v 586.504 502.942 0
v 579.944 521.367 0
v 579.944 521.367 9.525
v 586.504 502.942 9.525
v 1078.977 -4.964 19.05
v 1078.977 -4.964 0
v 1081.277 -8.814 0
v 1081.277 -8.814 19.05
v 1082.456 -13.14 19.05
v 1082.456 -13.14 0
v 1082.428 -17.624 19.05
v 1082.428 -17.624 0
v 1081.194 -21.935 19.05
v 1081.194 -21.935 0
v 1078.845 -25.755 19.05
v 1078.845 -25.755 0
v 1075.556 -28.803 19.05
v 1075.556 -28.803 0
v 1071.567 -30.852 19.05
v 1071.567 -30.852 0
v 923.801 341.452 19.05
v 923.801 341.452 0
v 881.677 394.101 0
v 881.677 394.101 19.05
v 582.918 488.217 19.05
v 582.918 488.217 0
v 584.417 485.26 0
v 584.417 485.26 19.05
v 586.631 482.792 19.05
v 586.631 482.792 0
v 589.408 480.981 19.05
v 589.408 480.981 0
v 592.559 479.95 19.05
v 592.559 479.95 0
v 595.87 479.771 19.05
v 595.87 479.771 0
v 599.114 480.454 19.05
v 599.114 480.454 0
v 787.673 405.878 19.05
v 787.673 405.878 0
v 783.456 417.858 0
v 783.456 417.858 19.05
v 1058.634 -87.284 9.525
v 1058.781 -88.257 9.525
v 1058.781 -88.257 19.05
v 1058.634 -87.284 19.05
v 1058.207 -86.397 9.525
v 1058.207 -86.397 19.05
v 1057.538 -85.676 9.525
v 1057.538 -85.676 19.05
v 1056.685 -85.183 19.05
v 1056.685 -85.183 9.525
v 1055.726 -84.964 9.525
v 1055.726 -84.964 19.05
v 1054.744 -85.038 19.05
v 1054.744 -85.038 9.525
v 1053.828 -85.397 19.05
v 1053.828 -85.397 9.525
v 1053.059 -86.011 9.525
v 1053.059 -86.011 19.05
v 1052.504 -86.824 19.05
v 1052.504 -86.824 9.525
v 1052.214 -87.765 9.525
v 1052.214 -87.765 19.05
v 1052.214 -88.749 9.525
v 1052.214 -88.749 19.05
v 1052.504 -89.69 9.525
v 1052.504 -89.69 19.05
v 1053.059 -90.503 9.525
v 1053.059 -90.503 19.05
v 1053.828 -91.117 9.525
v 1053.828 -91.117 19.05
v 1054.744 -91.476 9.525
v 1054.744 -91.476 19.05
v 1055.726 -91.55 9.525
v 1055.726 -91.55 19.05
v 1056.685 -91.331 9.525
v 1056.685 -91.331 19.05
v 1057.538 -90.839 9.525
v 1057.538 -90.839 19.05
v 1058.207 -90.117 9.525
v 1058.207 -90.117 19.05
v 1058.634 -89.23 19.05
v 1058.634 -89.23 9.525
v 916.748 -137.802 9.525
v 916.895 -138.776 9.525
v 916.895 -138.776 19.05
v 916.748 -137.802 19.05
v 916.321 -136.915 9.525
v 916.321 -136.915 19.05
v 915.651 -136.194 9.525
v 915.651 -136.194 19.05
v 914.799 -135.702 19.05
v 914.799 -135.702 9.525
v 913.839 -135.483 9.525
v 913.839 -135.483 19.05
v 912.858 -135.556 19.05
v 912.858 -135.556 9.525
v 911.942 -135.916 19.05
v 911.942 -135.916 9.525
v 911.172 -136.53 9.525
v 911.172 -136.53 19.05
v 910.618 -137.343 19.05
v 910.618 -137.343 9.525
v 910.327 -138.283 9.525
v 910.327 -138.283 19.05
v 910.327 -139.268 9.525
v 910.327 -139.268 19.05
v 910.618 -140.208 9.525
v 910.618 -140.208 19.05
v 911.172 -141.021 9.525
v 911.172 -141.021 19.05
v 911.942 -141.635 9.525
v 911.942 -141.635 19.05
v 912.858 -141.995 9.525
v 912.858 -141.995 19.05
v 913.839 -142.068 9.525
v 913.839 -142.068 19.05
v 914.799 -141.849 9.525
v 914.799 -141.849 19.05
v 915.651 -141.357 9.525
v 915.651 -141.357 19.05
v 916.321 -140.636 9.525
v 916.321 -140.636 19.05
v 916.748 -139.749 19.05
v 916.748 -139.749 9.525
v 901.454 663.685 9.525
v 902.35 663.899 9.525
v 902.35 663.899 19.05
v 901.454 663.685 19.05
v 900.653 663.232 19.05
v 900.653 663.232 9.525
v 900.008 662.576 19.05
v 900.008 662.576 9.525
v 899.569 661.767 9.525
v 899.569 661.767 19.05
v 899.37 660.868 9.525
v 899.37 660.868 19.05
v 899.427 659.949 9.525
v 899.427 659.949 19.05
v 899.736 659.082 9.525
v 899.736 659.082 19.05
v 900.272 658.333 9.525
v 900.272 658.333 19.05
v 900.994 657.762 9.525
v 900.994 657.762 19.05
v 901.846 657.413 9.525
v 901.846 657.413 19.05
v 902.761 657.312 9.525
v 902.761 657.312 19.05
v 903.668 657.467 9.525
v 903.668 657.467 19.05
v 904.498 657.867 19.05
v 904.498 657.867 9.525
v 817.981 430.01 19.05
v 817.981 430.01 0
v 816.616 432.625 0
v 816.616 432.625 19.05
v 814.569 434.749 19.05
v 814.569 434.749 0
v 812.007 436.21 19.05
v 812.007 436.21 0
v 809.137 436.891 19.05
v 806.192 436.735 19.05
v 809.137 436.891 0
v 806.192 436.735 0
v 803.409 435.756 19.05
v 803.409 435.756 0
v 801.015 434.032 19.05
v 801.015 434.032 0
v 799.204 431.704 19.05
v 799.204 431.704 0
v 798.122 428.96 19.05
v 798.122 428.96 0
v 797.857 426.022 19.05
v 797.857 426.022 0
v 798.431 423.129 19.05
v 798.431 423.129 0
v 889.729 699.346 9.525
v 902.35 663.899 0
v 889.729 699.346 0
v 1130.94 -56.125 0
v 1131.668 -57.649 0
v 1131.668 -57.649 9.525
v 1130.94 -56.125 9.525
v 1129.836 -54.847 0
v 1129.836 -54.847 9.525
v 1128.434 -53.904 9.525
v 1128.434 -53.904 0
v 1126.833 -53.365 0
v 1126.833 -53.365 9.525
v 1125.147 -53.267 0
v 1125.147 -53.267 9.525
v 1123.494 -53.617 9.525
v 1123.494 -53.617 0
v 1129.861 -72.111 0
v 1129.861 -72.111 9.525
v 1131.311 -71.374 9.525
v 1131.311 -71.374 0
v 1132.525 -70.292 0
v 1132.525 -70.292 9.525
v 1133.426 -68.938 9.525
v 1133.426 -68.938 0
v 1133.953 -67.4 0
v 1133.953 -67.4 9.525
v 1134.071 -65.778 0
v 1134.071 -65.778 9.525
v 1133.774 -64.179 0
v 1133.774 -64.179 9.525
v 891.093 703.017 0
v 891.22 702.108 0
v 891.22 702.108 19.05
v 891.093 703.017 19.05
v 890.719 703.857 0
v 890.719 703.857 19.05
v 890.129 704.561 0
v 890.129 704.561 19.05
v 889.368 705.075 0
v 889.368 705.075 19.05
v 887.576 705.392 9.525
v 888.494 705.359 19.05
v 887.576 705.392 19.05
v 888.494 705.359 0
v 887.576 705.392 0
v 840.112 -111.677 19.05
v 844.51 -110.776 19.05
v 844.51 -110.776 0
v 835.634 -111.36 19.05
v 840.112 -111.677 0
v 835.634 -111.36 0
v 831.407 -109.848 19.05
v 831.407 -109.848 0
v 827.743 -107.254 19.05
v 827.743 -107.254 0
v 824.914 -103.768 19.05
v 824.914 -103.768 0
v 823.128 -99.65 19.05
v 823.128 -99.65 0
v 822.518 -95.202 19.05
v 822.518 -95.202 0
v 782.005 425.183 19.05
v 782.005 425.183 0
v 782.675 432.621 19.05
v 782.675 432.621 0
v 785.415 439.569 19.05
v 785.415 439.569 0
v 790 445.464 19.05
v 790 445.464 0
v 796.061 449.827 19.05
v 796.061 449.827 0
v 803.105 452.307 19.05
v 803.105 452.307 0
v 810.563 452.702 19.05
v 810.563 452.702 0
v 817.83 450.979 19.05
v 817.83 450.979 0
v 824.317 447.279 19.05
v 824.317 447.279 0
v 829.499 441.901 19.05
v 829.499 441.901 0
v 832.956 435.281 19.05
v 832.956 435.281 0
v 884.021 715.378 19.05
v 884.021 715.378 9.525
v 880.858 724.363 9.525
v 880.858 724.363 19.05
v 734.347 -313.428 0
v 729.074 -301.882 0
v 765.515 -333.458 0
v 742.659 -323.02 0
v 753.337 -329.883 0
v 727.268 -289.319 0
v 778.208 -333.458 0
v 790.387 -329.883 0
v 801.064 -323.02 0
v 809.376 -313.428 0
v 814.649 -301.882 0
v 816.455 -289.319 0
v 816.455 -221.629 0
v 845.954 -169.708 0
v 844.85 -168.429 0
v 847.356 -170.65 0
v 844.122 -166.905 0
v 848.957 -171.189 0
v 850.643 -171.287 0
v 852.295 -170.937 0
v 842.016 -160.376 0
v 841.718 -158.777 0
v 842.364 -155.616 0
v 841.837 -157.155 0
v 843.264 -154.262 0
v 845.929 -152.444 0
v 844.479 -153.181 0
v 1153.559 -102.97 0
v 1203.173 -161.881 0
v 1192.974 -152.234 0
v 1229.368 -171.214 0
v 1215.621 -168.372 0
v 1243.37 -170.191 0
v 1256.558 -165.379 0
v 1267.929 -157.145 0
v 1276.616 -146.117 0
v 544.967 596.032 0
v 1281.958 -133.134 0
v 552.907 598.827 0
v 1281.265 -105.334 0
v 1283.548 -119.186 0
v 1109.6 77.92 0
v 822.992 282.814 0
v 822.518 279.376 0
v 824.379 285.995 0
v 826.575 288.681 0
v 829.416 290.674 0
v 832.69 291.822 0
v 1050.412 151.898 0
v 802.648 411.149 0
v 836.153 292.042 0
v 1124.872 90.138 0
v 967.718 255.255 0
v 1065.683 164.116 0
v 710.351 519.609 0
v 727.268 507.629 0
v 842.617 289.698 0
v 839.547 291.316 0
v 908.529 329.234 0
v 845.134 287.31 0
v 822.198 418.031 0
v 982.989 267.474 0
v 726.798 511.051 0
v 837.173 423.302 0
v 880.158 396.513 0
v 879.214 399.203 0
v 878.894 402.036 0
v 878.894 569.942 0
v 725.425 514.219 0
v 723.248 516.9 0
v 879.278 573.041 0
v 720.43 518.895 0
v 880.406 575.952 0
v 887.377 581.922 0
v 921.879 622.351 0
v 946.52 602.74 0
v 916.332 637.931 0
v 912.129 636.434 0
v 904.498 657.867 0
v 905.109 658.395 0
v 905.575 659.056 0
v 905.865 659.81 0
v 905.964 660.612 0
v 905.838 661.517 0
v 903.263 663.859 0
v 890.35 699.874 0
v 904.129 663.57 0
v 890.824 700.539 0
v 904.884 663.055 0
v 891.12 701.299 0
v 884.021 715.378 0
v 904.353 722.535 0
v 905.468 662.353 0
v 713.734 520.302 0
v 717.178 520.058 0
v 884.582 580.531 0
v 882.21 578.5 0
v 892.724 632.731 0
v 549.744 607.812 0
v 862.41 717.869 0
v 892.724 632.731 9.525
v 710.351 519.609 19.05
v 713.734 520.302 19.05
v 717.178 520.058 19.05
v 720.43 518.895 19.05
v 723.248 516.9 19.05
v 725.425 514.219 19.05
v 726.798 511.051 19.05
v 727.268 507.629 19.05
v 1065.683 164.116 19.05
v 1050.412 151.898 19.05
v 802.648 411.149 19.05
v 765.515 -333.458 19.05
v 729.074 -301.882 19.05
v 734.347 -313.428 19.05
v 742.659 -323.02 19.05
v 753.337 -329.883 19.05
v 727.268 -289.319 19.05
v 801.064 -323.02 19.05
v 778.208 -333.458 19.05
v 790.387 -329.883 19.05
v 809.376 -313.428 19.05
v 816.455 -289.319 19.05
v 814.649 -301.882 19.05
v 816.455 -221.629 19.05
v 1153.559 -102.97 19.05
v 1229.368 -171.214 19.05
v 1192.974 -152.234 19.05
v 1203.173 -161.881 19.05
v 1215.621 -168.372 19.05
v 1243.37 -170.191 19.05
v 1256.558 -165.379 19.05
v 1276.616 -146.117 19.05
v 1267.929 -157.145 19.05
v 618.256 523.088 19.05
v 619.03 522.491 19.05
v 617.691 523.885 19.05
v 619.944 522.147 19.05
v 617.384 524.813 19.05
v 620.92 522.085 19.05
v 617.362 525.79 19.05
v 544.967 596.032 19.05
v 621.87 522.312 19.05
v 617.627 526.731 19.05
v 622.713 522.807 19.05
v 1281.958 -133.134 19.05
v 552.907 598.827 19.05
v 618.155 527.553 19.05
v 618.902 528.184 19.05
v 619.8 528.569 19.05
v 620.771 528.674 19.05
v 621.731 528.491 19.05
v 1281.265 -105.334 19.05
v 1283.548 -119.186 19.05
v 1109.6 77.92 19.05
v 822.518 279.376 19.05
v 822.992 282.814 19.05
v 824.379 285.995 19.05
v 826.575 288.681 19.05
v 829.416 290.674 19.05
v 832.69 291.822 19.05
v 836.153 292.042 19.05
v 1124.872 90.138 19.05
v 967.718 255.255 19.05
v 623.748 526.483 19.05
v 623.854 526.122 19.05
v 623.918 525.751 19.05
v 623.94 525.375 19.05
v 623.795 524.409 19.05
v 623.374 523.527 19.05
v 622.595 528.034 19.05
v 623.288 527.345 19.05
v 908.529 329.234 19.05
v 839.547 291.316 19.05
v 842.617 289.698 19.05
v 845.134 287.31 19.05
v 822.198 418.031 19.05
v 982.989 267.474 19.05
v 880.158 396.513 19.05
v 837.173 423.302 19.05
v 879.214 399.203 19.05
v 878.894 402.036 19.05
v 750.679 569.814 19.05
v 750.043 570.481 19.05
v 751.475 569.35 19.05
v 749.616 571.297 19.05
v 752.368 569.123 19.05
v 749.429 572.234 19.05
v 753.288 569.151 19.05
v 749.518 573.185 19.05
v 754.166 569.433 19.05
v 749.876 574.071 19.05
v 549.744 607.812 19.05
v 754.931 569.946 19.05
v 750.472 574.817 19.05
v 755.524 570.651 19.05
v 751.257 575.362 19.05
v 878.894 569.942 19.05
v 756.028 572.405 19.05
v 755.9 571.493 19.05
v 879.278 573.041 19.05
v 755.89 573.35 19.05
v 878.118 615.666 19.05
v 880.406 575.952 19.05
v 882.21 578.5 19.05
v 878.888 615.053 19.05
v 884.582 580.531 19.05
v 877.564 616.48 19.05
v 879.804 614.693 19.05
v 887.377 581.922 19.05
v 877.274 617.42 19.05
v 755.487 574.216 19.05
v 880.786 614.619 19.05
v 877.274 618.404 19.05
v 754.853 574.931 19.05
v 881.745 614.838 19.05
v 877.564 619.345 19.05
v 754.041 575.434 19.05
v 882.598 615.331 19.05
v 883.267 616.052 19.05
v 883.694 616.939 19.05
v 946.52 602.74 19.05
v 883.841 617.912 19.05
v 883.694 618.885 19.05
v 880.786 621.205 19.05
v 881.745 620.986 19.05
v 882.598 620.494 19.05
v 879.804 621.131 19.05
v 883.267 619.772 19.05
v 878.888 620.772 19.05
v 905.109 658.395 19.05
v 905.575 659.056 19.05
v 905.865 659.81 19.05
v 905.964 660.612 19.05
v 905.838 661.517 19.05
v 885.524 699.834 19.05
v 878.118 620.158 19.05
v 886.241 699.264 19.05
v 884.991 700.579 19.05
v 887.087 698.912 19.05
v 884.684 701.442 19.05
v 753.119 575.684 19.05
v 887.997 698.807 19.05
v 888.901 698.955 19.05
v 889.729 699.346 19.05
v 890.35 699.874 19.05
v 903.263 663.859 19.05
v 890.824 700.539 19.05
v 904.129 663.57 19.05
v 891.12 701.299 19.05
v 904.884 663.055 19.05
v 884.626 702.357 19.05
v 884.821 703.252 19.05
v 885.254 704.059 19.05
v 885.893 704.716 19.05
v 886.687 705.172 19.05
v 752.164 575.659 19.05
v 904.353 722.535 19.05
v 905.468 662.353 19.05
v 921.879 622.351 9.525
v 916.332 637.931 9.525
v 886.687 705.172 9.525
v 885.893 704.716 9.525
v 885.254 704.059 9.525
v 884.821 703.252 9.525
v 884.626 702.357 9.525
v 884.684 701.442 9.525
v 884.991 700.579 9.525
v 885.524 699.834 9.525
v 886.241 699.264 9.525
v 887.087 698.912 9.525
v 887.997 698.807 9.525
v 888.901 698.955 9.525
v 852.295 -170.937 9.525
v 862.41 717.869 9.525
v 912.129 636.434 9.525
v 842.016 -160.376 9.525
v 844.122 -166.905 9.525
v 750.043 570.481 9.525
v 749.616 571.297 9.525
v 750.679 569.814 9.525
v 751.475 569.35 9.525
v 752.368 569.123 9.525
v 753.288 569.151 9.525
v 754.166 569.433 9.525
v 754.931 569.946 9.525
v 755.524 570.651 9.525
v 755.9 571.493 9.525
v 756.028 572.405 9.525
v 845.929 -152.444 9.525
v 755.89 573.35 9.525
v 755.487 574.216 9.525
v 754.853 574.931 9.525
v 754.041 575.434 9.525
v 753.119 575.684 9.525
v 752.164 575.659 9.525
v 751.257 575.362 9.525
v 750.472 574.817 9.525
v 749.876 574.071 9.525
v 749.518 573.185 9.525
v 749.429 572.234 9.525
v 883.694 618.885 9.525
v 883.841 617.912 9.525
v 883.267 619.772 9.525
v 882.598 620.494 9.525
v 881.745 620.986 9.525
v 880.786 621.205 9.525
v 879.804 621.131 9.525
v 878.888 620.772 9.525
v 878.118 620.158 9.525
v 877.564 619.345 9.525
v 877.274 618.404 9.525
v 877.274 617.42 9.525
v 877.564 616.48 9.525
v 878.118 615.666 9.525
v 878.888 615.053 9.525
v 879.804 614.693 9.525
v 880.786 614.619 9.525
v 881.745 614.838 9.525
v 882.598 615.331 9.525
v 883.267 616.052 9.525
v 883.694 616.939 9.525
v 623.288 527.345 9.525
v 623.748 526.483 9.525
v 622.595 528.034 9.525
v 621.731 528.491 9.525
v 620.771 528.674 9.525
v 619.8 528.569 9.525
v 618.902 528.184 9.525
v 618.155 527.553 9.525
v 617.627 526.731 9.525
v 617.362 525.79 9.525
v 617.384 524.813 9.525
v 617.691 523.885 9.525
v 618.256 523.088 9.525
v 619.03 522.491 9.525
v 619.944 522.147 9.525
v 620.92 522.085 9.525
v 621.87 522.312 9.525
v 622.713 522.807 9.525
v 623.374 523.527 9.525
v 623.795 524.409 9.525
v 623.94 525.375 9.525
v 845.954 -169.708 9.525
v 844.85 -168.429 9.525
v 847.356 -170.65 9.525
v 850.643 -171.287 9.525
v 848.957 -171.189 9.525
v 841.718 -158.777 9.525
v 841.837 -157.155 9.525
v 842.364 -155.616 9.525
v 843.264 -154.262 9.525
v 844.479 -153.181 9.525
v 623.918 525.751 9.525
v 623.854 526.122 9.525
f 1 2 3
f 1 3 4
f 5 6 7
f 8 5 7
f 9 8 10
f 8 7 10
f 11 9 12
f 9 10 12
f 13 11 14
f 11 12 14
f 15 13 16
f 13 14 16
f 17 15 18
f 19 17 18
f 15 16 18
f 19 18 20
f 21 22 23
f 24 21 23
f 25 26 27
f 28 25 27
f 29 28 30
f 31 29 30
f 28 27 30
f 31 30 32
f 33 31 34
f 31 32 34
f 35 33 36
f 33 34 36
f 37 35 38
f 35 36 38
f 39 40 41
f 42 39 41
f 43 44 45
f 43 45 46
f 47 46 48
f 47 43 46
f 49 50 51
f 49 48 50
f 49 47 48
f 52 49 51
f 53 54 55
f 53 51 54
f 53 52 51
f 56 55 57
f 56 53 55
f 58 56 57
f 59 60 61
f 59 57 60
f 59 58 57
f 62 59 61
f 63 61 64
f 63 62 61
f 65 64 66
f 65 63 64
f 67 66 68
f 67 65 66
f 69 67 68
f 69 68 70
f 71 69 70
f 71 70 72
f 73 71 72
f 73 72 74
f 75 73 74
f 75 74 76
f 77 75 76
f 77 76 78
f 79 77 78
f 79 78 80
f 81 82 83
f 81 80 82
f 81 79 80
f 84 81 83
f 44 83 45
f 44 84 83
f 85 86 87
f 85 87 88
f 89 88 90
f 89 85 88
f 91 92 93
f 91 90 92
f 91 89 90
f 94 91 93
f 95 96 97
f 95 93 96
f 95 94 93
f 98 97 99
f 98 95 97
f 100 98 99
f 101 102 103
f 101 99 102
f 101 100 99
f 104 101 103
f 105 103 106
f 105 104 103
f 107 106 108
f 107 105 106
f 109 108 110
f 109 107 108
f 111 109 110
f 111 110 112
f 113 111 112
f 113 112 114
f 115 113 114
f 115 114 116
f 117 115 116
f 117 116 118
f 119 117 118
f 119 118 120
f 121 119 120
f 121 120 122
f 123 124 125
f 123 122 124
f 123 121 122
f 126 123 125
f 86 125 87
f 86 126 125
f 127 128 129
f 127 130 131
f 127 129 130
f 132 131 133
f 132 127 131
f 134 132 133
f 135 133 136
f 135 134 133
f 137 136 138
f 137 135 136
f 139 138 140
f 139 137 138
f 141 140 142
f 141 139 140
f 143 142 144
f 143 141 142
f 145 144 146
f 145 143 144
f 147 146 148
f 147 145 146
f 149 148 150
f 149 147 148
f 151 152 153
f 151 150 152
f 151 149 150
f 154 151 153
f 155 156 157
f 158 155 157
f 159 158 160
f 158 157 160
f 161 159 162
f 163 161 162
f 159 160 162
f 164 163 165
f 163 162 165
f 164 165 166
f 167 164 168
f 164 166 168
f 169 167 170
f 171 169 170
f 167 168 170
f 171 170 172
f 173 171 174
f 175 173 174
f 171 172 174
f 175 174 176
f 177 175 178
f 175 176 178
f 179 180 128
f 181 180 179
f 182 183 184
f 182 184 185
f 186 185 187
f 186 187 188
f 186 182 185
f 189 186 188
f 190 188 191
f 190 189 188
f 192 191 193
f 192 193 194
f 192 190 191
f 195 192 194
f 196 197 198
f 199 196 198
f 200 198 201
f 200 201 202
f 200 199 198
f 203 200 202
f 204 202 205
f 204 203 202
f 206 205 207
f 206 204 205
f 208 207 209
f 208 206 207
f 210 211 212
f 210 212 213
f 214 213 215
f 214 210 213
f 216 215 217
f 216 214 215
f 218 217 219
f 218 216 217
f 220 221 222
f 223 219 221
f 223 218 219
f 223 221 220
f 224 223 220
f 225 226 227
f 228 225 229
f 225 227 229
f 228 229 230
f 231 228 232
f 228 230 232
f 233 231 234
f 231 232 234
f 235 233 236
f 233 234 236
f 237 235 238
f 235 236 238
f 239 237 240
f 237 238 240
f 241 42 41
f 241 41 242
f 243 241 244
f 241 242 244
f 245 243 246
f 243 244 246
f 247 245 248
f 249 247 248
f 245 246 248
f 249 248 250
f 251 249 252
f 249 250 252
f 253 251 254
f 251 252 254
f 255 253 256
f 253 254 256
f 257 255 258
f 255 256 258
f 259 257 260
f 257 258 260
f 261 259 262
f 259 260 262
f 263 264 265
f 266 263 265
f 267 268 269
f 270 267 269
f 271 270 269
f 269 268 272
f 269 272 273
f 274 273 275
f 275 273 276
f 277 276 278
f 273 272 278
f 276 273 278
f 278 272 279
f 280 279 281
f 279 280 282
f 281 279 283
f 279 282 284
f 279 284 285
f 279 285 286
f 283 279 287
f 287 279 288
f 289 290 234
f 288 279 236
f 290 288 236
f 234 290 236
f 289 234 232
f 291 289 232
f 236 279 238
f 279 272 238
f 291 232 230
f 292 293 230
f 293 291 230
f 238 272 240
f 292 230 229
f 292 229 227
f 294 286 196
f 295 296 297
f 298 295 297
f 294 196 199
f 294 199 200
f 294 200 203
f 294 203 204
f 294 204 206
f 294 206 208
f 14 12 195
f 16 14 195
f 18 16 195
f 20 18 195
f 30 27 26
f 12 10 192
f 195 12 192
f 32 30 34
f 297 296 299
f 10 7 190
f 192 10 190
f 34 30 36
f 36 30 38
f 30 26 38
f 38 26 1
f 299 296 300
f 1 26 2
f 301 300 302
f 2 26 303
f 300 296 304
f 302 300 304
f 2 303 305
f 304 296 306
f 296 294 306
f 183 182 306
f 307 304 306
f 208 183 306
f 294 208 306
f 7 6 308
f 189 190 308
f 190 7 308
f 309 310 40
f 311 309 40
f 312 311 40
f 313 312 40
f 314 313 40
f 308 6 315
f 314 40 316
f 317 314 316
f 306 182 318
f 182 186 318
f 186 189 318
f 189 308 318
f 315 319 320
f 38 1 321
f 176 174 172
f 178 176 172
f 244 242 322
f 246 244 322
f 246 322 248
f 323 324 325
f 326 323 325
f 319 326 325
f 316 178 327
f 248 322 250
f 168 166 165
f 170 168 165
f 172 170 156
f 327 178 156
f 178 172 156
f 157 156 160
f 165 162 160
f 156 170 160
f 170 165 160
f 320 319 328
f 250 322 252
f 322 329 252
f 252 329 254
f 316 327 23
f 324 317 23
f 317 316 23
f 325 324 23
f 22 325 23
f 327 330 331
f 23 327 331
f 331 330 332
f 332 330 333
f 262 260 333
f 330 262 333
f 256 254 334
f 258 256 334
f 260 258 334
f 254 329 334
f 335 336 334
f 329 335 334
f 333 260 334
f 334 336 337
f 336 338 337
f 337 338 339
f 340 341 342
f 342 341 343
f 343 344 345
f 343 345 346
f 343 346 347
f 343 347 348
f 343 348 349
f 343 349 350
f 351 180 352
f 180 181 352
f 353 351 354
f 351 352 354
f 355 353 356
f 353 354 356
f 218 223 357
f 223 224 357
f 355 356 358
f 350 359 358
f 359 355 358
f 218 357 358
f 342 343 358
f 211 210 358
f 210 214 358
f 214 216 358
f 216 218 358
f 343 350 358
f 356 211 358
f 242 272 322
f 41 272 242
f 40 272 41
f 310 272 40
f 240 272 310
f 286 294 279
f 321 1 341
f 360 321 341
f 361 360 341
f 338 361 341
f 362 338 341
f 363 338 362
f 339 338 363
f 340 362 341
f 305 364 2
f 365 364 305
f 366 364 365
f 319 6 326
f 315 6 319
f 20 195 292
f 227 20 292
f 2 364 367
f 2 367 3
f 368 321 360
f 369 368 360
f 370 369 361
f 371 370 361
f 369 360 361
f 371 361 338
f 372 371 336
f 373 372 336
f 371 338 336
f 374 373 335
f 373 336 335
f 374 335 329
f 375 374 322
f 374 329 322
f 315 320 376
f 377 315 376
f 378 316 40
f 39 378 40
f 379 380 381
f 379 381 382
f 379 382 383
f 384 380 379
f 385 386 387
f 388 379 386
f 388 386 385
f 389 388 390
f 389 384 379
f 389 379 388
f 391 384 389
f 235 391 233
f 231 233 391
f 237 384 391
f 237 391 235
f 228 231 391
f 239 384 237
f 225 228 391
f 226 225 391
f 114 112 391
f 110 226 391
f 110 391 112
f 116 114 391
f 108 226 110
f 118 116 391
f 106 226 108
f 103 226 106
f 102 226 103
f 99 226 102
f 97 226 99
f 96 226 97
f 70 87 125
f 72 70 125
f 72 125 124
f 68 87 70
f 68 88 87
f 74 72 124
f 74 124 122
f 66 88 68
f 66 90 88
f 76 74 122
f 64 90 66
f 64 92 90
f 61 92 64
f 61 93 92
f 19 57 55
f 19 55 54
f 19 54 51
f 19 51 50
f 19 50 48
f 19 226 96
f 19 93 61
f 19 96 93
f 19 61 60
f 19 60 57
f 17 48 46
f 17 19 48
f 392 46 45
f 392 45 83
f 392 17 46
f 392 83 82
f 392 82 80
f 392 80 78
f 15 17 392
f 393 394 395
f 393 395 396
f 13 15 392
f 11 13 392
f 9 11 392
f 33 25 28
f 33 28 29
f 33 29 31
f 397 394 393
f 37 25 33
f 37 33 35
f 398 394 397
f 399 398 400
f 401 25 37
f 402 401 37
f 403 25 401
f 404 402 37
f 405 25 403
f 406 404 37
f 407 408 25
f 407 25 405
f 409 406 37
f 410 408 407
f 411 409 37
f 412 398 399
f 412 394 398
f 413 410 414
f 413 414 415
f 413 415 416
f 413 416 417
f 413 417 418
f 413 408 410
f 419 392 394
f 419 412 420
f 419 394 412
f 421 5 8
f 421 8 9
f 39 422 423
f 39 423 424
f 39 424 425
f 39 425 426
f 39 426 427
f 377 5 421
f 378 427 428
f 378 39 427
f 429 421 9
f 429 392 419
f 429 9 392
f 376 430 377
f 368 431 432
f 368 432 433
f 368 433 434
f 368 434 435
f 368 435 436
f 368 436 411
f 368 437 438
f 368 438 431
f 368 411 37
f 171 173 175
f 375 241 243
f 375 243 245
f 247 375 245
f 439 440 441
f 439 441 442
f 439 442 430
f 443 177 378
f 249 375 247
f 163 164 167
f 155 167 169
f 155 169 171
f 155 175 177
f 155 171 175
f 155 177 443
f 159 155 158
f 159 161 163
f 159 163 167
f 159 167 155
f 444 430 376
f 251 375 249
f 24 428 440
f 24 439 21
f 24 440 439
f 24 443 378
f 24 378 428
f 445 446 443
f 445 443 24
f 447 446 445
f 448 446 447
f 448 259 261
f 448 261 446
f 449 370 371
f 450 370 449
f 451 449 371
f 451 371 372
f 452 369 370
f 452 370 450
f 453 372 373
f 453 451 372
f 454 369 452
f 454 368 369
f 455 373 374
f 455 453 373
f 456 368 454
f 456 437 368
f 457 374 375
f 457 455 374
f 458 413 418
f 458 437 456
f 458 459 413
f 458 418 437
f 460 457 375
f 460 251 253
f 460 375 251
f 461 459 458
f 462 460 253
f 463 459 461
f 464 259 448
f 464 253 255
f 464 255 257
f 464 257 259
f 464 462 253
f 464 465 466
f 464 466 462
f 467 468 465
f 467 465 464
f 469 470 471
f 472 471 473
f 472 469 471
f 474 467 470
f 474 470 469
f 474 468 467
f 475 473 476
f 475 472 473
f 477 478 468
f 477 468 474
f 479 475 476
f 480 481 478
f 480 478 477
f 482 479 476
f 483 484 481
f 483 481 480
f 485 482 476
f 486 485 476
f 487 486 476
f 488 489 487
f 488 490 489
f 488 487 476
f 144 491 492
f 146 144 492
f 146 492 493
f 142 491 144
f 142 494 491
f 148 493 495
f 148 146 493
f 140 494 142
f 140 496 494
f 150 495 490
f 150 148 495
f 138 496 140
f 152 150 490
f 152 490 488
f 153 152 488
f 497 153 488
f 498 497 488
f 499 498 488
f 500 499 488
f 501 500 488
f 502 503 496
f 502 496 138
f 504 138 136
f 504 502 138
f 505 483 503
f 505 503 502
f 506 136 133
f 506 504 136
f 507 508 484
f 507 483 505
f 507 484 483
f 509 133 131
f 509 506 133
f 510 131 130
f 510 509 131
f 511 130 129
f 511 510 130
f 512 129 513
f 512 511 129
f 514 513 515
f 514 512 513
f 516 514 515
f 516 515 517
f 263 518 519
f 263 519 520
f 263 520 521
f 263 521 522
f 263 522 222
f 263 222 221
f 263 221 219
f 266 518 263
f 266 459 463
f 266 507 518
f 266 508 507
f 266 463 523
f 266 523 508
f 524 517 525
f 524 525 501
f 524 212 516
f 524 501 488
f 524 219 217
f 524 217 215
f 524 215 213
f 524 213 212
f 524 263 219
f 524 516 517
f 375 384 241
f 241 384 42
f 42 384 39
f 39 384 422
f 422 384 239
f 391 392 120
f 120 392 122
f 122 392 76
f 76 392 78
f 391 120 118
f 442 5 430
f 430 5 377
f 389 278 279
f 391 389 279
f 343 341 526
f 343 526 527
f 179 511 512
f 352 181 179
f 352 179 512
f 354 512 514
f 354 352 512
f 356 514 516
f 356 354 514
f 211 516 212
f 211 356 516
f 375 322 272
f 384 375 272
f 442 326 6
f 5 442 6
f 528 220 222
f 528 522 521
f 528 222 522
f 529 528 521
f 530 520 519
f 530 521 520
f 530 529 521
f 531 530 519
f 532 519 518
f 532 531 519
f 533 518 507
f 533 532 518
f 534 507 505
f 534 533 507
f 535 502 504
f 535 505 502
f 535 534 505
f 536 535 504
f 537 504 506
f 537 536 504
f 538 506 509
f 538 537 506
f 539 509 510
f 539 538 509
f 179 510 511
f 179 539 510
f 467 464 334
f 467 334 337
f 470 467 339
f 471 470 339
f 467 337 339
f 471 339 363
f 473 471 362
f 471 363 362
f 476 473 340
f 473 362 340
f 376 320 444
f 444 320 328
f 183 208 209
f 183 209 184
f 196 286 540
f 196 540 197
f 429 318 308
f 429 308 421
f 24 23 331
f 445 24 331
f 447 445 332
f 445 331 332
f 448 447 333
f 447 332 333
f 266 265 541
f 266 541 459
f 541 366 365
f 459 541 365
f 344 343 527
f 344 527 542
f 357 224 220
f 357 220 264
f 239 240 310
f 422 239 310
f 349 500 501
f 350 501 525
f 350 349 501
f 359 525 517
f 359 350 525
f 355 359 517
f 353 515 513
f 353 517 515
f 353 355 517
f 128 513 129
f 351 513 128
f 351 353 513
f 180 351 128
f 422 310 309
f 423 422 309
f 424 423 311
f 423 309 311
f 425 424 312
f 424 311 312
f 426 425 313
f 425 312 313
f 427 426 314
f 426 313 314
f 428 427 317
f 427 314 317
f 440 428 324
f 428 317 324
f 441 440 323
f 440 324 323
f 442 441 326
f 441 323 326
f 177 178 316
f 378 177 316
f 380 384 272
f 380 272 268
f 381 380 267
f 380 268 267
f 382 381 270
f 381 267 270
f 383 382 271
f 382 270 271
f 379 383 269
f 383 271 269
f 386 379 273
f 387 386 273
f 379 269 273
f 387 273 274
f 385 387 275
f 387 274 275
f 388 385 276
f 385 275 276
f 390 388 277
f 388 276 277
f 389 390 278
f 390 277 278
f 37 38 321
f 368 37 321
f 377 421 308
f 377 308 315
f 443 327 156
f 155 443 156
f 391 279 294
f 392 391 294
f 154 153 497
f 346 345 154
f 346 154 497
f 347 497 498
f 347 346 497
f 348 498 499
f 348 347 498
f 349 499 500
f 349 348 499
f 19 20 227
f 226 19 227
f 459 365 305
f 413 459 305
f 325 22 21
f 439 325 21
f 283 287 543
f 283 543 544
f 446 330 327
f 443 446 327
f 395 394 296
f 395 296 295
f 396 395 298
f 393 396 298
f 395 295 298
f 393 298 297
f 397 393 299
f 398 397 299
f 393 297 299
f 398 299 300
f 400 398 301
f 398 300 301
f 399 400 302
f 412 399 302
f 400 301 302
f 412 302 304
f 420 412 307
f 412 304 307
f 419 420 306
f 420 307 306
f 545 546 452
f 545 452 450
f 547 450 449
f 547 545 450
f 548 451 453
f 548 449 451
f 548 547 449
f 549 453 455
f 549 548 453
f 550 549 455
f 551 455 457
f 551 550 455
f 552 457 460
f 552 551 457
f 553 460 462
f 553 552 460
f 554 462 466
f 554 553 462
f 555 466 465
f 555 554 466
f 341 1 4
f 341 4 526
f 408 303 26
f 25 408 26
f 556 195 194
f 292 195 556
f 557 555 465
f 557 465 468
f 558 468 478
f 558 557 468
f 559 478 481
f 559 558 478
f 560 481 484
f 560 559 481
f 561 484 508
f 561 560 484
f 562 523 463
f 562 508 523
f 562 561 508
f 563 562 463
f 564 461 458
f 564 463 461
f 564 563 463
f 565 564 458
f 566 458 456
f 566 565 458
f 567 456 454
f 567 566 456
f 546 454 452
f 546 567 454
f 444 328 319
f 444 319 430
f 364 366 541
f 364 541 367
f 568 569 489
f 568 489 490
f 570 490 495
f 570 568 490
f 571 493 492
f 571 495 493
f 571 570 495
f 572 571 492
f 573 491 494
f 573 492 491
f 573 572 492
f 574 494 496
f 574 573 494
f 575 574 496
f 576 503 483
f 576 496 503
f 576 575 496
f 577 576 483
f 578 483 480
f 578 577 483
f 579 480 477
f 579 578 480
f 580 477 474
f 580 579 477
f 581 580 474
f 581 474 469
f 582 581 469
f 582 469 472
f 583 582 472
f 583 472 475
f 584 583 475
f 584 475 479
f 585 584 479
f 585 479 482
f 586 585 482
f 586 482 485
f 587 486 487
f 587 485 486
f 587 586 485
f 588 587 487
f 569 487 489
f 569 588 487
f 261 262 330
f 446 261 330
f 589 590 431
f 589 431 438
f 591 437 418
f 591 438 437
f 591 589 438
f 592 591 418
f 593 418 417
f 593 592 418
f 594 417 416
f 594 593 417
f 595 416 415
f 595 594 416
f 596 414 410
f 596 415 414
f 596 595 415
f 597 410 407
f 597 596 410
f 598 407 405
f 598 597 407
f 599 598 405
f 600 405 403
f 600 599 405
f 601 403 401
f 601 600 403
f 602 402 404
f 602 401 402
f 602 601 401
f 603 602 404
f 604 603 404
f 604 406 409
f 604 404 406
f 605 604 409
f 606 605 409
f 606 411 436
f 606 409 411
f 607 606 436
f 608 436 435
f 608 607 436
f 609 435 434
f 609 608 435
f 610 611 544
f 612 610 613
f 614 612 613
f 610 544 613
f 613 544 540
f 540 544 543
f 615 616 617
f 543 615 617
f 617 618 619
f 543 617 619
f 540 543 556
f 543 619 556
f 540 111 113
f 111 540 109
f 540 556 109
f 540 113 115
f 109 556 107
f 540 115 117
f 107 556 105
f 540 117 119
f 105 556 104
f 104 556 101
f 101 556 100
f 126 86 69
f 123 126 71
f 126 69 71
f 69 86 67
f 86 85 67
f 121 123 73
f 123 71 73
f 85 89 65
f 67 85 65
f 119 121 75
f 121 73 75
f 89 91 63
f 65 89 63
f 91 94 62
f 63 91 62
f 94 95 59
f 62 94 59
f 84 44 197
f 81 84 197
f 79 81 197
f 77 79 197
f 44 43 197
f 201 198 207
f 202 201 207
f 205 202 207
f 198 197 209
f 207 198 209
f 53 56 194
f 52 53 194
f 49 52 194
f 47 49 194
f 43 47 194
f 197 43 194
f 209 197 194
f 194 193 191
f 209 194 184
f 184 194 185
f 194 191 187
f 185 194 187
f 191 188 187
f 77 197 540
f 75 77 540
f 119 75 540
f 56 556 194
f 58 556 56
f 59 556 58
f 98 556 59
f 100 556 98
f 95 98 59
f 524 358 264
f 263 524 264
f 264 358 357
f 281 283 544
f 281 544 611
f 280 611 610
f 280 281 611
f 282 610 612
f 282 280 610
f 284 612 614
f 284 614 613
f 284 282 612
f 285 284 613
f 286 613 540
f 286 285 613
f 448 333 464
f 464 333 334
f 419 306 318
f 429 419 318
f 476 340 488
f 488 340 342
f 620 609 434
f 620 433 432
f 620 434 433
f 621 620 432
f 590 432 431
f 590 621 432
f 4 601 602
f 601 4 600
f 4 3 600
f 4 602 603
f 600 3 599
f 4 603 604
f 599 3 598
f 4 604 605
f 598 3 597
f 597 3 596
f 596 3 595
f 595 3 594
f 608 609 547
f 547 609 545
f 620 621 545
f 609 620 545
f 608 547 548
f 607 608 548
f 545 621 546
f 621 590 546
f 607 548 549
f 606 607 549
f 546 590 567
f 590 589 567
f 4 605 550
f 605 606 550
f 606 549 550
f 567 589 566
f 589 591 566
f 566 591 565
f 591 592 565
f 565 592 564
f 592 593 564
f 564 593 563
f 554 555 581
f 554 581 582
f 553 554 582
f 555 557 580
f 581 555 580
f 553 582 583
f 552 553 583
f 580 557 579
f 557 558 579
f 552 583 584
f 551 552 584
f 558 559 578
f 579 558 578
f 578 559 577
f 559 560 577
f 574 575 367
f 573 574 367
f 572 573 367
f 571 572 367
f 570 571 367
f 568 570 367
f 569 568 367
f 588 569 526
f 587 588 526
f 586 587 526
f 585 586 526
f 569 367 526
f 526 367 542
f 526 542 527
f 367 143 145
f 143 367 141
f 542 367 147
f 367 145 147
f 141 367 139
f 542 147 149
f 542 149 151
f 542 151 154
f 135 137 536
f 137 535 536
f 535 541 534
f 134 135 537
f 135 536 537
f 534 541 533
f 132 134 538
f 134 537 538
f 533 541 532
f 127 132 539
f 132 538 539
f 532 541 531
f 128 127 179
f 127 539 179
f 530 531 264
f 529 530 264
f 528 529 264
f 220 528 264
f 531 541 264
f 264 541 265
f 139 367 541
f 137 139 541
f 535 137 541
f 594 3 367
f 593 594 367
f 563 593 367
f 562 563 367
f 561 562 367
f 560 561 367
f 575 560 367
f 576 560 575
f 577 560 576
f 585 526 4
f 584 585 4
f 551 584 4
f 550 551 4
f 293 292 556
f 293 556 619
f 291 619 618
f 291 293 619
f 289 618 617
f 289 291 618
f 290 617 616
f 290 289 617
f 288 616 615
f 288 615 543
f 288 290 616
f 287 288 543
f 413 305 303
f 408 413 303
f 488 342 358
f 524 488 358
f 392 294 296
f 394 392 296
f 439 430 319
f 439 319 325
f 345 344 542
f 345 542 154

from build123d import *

# Parameters (mm, degrees)
F1_DEPTH = 19.05
F3_DEPTH = 9.525
F5_DEPTH = 9.525
F6_W     = 94.742
F6_H     = 19.05
F6_H_2   = 22.0252738774
F7_DEPTH = 19.558
F8_R     = 3.302
F9_DEPTH = 19.051


# Not quite as in the source:
# - ends of sketch curves that miss each other by under 0.0002 mm in the source are joined
# - a feature names something its author has since deleted; it is built from what else it names
# - the program builds the solid bodies; features that only make, move or delete a surface that nothing else refers to are left out


with BuildPart() as f1:
    # F0 (on Top) → F1 (new body)
    with BuildSketch(Plane.XY):
        with BuildLine():
            Line((727.2677384075, 507.6293858847), (727.2677384075, -289.3185215378))
            ThreePointArc((727.2677384075, -289.3185215378), (771.8616098047, -333.912392935), (816.4554812019, -289.3185215378))
            Line((816.4554812019, -289.3185215378), (816.4554812019, -221.6290421598))
            Line((816.4554812019, -221.6290421598), (1153.5588304871, -102.9697649078))
            Line((1153.5588304871, -102.9697649078), (1192.9737952894, -152.2336658633))
            ThreePointArc((1192.9737952894, -152.2336658633), (1256.5580507142, -165.3785793409), (1281.2649482254, -105.3342998163))
            Line((1281.2649482254, -105.3342998163), (881.6774022659, 394.10141923))
            ThreePointArc((881.6774022659, 394.10141923), (879.6100790274, 397.83144491), (878.8940586752, 402.0355181492))
            Line((878.8940586752, 402.0355181492), (878.8940586752, 569.9420720746))
            ThreePointArc((878.8940586752, 569.9420720746), (881.2296299338, 577.2815963686), (887.3773054254, 581.9215959395))
            Line((887.3773054254, 581.9215959395), (946.5202680448, 602.7397254948))
            Line((946.5202680448, 602.7397254948), (904.3527355464, 722.5349641439))
            Line((904.3527355464, 722.5349641439), (884.020881133, 715.3782178375))
            Line((884.020881133, 715.3782178375), (880.8583161956, 724.3628607361))
            Line((880.8583161956, 724.3628607361), (549.7442765695, 607.8118009104))
            Line((549.7442765695, 607.8118009104), (552.906841507, 598.8271580117))
            Line((552.906841507, 598.8271580117), (544.9670195991, 596.0323666485))
            Line((544.9670195991, 596.0323666485), (582.9177988478, 488.2166518643))
            ThreePointArc((582.9177988478, 488.2166518643), (589.40821497, 480.9809077363), (599.1140759625, 480.4538812492))
            Line((599.1140759625, 480.4538812492), (710.3509851577, 519.6089097496))
            ThreePointArc((710.3509851577, 519.6089097497), (721.9072627016, 517.9938146262), (727.2677384075, 507.6293858847))
        make_face()
        with BuildLine():
            ThreePointArc((844.5095176323, -110.7755588107), (829.4863568252, -108.6759351502), (822.5177384075, -95.2021777863))
            Line((822.5177384075, -95.2021777863), (822.5177384075, 279.3762959499))
            ThreePointArc((822.5177384075, 279.3762959499), (831.0136651683, 291.3602755977), (845.1343948168, 287.3103948691))
            Line((845.1343948168, 287.3103948691), (1078.976974464, -4.9643221252))
            ThreePointArc((1078.976974464, -4.9643221252), (1081.9579117622, -19.8218837855), (1071.5671003568, -30.8520317446))
            Line((1071.5671003568, -30.8520317446), (844.5095176323, -110.7755588107))
        make_face(mode=Mode.SUBTRACT)
        with BuildLine():
            Line((822.1982316908, 418.0308171084), (817.981478441, 430.0103409733))
            ThreePointArc((817.981478441, 430.0103409733), (804.7653209472, 436.3447634256), (798.4309001253, 423.1286012999))
            Line((798.4309001253, 423.1286012999), (802.6476533752, 411.149077435))
            Line((802.6476533752, 411.149077435), (787.6732485441, 405.8781358727))
            Line((787.6732485441, 405.8781358727), (783.4564952942, 417.8576597376))
            ThreePointArc((783.4564952942, 417.8576597376), (799.4943781806, 451.3191657439), (832.9558841868, 435.2812828576))
            Line((832.9558841868, 435.2812828576), (837.1726374367, 423.3017589927))
            Line((837.1726374367, 423.3017589927), (822.1982316908, 418.0308171084))
        make_face(mode=Mode.SUBTRACT)
    extrude(amount=F1_DEPTH)

    # F2 (on face) → F3 (cut)
    with BuildSketch(Plane.XY):
        with BuildLine():
            ThreePointArc((844.1222933391, -166.9052020902), (847.3560158569, -170.6500208272), (852.2954479263, -170.9374917442))
            Line((852.2954479263, -170.9374917442), (1129.8610507564, -72.1108335167))
            ThreePointArc((1129.8610507564, -72.1108335167), (1133.425786756, -68.9382065458), (1133.77435322, -64.1788572139))
            Line((1133.77435322, -64.1788572139), (1131.667577719, -57.6492424267))
            ThreePointArc((1131.667577719, -57.6492424267), (1128.4338552012, -53.9044236898), (1123.4944231318, -53.6169527728))
            Line((1123.4944231318, -53.6169527728), (845.9288203018, -152.4436110002))
            ThreePointArc((845.9288203018, -152.4436110002), (842.3640843021, -155.6162379711), (842.0155178382, -160.3755873031))
            Line((842.0155178382, -160.3755873031), (844.1222933391, -166.9052020902))
        make_face()
    extrude(amount=F3_DEPTH, mode=Mode.SUBTRACT)

    # F4 (on face) → F5 (cut)
    with BuildSketch(Plane.XY):
        Polygon((579.9443241227, 521.366756094), (586.5044770697, 502.9417796404), (921.8787370541, 622.3506942479), (916.3315891482, 637.930524532), (912.1286802343, 636.4340924814), (884.020881133, 715.3782178375), (880.8583161956, 724.3628607361), (862.3802941818, 717.9536434315), (892.7236092325, 632.7308033777), align=None)
    extrude(amount=F5_DEPTH, mode=Mode.SUBTRACT)

    # F6 (on face) → F7 (cut)
    with BuildSketch(Plane(origin=(729.8159568657, 583.9097126711, 0), x_dir=(-0.6247321984, 0.7808390873, 0), z_dir=(0.7808390873, 0.6247321984, 0))):
        with Locations((-357.8801403508, 9.525)):
            Rectangle(F6_W, F6_H)
        with Locations((-584.9891603508, 10.3152221296)):
            Rectangle(F6_W, F6_H_2)
    extrude(amount=-F7_DEPTH, mode=Mode.SUBTRACT)

    # F8 (on face) → F9 (cut, through all)
    with BuildSketch(Plane.XY):
        with BuildLine():
            ThreePointArc((902.3498094673, 663.8992240234), (899.5515171423, 659.5044786379), (904.4975380125, 657.8670707804))
            Line((904.4975380125, 657.8670707804), (902.3498094673, 663.8992240234))
        make_face()
        with BuildLine():
            ThreePointArc((887.5764301967, 705.3920317976), (884.8076232072, 701.0002222812), (889.7289379426, 699.3464555963))
            Line((889.7289379426, 699.3464555963), (887.5764301967, 705.3920317976))
        make_face()
        with BuildLine():
            Line((887.5764301967, 705.3920317976), (889.7289379426, 699.3464555963))
            ThreePointArc((889.7289379426, 699.3464555963), (890.8236579238, 700.5386106967), (891.2203335175, 702.107780571))
            ThreePointArc((891.2203335175, 702.107780571), (890.1290165833, 704.5605513272), (887.5764301967, 705.3920317976))
        make_face()
        with BuildLine():
            Line((902.3498094673, 663.8992240234), (904.4975380125, 657.8670707804))
            ThreePointArc((904.4975380125, 657.8670707804), (905.5745632393, 659.0559185948), (905.9642274527, 660.6120369276))
            ThreePointArc((905.9642274527, 660.6120369276), (904.8838934731, 663.0548639976), (902.3498094673, 663.8992240234))
        make_face()
        with Locations((880.5389518172, 617.9122097817)):
            Circle(F8_R)
        with BuildLine():
            ThreePointArc((623.7483495144, 526.4827509324), (617.3838130375, 524.8132146381), (623.9396392041, 525.3751926427))
            ThreePointArc((623.9396392041, 525.3751926427), (623.8914653707, 525.9371706472), (623.7483495144, 526.4827509324))
        make_face()
        with BuildLine():
            ThreePointArc((756.0284718398, 572.4049919407), (752.1644938352, 575.6588181073), (749.6157615295, 571.2974336509))
            ThreePointArc((749.6157615295, 571.2974336509), (753.2884498444, 569.1511657741), (756.0284718398, 572.4049919407))
        make_face()
        with Locations((1055.4790926394, -88.2571151612)):
            Circle(F8_R)
        with Locations((913.5925848765, -138.7755124943)):
            Circle(F8_R)
    extrude(amount=F9_DEPTH, mode=Mode.SUBTRACT)


solid = f1.part
